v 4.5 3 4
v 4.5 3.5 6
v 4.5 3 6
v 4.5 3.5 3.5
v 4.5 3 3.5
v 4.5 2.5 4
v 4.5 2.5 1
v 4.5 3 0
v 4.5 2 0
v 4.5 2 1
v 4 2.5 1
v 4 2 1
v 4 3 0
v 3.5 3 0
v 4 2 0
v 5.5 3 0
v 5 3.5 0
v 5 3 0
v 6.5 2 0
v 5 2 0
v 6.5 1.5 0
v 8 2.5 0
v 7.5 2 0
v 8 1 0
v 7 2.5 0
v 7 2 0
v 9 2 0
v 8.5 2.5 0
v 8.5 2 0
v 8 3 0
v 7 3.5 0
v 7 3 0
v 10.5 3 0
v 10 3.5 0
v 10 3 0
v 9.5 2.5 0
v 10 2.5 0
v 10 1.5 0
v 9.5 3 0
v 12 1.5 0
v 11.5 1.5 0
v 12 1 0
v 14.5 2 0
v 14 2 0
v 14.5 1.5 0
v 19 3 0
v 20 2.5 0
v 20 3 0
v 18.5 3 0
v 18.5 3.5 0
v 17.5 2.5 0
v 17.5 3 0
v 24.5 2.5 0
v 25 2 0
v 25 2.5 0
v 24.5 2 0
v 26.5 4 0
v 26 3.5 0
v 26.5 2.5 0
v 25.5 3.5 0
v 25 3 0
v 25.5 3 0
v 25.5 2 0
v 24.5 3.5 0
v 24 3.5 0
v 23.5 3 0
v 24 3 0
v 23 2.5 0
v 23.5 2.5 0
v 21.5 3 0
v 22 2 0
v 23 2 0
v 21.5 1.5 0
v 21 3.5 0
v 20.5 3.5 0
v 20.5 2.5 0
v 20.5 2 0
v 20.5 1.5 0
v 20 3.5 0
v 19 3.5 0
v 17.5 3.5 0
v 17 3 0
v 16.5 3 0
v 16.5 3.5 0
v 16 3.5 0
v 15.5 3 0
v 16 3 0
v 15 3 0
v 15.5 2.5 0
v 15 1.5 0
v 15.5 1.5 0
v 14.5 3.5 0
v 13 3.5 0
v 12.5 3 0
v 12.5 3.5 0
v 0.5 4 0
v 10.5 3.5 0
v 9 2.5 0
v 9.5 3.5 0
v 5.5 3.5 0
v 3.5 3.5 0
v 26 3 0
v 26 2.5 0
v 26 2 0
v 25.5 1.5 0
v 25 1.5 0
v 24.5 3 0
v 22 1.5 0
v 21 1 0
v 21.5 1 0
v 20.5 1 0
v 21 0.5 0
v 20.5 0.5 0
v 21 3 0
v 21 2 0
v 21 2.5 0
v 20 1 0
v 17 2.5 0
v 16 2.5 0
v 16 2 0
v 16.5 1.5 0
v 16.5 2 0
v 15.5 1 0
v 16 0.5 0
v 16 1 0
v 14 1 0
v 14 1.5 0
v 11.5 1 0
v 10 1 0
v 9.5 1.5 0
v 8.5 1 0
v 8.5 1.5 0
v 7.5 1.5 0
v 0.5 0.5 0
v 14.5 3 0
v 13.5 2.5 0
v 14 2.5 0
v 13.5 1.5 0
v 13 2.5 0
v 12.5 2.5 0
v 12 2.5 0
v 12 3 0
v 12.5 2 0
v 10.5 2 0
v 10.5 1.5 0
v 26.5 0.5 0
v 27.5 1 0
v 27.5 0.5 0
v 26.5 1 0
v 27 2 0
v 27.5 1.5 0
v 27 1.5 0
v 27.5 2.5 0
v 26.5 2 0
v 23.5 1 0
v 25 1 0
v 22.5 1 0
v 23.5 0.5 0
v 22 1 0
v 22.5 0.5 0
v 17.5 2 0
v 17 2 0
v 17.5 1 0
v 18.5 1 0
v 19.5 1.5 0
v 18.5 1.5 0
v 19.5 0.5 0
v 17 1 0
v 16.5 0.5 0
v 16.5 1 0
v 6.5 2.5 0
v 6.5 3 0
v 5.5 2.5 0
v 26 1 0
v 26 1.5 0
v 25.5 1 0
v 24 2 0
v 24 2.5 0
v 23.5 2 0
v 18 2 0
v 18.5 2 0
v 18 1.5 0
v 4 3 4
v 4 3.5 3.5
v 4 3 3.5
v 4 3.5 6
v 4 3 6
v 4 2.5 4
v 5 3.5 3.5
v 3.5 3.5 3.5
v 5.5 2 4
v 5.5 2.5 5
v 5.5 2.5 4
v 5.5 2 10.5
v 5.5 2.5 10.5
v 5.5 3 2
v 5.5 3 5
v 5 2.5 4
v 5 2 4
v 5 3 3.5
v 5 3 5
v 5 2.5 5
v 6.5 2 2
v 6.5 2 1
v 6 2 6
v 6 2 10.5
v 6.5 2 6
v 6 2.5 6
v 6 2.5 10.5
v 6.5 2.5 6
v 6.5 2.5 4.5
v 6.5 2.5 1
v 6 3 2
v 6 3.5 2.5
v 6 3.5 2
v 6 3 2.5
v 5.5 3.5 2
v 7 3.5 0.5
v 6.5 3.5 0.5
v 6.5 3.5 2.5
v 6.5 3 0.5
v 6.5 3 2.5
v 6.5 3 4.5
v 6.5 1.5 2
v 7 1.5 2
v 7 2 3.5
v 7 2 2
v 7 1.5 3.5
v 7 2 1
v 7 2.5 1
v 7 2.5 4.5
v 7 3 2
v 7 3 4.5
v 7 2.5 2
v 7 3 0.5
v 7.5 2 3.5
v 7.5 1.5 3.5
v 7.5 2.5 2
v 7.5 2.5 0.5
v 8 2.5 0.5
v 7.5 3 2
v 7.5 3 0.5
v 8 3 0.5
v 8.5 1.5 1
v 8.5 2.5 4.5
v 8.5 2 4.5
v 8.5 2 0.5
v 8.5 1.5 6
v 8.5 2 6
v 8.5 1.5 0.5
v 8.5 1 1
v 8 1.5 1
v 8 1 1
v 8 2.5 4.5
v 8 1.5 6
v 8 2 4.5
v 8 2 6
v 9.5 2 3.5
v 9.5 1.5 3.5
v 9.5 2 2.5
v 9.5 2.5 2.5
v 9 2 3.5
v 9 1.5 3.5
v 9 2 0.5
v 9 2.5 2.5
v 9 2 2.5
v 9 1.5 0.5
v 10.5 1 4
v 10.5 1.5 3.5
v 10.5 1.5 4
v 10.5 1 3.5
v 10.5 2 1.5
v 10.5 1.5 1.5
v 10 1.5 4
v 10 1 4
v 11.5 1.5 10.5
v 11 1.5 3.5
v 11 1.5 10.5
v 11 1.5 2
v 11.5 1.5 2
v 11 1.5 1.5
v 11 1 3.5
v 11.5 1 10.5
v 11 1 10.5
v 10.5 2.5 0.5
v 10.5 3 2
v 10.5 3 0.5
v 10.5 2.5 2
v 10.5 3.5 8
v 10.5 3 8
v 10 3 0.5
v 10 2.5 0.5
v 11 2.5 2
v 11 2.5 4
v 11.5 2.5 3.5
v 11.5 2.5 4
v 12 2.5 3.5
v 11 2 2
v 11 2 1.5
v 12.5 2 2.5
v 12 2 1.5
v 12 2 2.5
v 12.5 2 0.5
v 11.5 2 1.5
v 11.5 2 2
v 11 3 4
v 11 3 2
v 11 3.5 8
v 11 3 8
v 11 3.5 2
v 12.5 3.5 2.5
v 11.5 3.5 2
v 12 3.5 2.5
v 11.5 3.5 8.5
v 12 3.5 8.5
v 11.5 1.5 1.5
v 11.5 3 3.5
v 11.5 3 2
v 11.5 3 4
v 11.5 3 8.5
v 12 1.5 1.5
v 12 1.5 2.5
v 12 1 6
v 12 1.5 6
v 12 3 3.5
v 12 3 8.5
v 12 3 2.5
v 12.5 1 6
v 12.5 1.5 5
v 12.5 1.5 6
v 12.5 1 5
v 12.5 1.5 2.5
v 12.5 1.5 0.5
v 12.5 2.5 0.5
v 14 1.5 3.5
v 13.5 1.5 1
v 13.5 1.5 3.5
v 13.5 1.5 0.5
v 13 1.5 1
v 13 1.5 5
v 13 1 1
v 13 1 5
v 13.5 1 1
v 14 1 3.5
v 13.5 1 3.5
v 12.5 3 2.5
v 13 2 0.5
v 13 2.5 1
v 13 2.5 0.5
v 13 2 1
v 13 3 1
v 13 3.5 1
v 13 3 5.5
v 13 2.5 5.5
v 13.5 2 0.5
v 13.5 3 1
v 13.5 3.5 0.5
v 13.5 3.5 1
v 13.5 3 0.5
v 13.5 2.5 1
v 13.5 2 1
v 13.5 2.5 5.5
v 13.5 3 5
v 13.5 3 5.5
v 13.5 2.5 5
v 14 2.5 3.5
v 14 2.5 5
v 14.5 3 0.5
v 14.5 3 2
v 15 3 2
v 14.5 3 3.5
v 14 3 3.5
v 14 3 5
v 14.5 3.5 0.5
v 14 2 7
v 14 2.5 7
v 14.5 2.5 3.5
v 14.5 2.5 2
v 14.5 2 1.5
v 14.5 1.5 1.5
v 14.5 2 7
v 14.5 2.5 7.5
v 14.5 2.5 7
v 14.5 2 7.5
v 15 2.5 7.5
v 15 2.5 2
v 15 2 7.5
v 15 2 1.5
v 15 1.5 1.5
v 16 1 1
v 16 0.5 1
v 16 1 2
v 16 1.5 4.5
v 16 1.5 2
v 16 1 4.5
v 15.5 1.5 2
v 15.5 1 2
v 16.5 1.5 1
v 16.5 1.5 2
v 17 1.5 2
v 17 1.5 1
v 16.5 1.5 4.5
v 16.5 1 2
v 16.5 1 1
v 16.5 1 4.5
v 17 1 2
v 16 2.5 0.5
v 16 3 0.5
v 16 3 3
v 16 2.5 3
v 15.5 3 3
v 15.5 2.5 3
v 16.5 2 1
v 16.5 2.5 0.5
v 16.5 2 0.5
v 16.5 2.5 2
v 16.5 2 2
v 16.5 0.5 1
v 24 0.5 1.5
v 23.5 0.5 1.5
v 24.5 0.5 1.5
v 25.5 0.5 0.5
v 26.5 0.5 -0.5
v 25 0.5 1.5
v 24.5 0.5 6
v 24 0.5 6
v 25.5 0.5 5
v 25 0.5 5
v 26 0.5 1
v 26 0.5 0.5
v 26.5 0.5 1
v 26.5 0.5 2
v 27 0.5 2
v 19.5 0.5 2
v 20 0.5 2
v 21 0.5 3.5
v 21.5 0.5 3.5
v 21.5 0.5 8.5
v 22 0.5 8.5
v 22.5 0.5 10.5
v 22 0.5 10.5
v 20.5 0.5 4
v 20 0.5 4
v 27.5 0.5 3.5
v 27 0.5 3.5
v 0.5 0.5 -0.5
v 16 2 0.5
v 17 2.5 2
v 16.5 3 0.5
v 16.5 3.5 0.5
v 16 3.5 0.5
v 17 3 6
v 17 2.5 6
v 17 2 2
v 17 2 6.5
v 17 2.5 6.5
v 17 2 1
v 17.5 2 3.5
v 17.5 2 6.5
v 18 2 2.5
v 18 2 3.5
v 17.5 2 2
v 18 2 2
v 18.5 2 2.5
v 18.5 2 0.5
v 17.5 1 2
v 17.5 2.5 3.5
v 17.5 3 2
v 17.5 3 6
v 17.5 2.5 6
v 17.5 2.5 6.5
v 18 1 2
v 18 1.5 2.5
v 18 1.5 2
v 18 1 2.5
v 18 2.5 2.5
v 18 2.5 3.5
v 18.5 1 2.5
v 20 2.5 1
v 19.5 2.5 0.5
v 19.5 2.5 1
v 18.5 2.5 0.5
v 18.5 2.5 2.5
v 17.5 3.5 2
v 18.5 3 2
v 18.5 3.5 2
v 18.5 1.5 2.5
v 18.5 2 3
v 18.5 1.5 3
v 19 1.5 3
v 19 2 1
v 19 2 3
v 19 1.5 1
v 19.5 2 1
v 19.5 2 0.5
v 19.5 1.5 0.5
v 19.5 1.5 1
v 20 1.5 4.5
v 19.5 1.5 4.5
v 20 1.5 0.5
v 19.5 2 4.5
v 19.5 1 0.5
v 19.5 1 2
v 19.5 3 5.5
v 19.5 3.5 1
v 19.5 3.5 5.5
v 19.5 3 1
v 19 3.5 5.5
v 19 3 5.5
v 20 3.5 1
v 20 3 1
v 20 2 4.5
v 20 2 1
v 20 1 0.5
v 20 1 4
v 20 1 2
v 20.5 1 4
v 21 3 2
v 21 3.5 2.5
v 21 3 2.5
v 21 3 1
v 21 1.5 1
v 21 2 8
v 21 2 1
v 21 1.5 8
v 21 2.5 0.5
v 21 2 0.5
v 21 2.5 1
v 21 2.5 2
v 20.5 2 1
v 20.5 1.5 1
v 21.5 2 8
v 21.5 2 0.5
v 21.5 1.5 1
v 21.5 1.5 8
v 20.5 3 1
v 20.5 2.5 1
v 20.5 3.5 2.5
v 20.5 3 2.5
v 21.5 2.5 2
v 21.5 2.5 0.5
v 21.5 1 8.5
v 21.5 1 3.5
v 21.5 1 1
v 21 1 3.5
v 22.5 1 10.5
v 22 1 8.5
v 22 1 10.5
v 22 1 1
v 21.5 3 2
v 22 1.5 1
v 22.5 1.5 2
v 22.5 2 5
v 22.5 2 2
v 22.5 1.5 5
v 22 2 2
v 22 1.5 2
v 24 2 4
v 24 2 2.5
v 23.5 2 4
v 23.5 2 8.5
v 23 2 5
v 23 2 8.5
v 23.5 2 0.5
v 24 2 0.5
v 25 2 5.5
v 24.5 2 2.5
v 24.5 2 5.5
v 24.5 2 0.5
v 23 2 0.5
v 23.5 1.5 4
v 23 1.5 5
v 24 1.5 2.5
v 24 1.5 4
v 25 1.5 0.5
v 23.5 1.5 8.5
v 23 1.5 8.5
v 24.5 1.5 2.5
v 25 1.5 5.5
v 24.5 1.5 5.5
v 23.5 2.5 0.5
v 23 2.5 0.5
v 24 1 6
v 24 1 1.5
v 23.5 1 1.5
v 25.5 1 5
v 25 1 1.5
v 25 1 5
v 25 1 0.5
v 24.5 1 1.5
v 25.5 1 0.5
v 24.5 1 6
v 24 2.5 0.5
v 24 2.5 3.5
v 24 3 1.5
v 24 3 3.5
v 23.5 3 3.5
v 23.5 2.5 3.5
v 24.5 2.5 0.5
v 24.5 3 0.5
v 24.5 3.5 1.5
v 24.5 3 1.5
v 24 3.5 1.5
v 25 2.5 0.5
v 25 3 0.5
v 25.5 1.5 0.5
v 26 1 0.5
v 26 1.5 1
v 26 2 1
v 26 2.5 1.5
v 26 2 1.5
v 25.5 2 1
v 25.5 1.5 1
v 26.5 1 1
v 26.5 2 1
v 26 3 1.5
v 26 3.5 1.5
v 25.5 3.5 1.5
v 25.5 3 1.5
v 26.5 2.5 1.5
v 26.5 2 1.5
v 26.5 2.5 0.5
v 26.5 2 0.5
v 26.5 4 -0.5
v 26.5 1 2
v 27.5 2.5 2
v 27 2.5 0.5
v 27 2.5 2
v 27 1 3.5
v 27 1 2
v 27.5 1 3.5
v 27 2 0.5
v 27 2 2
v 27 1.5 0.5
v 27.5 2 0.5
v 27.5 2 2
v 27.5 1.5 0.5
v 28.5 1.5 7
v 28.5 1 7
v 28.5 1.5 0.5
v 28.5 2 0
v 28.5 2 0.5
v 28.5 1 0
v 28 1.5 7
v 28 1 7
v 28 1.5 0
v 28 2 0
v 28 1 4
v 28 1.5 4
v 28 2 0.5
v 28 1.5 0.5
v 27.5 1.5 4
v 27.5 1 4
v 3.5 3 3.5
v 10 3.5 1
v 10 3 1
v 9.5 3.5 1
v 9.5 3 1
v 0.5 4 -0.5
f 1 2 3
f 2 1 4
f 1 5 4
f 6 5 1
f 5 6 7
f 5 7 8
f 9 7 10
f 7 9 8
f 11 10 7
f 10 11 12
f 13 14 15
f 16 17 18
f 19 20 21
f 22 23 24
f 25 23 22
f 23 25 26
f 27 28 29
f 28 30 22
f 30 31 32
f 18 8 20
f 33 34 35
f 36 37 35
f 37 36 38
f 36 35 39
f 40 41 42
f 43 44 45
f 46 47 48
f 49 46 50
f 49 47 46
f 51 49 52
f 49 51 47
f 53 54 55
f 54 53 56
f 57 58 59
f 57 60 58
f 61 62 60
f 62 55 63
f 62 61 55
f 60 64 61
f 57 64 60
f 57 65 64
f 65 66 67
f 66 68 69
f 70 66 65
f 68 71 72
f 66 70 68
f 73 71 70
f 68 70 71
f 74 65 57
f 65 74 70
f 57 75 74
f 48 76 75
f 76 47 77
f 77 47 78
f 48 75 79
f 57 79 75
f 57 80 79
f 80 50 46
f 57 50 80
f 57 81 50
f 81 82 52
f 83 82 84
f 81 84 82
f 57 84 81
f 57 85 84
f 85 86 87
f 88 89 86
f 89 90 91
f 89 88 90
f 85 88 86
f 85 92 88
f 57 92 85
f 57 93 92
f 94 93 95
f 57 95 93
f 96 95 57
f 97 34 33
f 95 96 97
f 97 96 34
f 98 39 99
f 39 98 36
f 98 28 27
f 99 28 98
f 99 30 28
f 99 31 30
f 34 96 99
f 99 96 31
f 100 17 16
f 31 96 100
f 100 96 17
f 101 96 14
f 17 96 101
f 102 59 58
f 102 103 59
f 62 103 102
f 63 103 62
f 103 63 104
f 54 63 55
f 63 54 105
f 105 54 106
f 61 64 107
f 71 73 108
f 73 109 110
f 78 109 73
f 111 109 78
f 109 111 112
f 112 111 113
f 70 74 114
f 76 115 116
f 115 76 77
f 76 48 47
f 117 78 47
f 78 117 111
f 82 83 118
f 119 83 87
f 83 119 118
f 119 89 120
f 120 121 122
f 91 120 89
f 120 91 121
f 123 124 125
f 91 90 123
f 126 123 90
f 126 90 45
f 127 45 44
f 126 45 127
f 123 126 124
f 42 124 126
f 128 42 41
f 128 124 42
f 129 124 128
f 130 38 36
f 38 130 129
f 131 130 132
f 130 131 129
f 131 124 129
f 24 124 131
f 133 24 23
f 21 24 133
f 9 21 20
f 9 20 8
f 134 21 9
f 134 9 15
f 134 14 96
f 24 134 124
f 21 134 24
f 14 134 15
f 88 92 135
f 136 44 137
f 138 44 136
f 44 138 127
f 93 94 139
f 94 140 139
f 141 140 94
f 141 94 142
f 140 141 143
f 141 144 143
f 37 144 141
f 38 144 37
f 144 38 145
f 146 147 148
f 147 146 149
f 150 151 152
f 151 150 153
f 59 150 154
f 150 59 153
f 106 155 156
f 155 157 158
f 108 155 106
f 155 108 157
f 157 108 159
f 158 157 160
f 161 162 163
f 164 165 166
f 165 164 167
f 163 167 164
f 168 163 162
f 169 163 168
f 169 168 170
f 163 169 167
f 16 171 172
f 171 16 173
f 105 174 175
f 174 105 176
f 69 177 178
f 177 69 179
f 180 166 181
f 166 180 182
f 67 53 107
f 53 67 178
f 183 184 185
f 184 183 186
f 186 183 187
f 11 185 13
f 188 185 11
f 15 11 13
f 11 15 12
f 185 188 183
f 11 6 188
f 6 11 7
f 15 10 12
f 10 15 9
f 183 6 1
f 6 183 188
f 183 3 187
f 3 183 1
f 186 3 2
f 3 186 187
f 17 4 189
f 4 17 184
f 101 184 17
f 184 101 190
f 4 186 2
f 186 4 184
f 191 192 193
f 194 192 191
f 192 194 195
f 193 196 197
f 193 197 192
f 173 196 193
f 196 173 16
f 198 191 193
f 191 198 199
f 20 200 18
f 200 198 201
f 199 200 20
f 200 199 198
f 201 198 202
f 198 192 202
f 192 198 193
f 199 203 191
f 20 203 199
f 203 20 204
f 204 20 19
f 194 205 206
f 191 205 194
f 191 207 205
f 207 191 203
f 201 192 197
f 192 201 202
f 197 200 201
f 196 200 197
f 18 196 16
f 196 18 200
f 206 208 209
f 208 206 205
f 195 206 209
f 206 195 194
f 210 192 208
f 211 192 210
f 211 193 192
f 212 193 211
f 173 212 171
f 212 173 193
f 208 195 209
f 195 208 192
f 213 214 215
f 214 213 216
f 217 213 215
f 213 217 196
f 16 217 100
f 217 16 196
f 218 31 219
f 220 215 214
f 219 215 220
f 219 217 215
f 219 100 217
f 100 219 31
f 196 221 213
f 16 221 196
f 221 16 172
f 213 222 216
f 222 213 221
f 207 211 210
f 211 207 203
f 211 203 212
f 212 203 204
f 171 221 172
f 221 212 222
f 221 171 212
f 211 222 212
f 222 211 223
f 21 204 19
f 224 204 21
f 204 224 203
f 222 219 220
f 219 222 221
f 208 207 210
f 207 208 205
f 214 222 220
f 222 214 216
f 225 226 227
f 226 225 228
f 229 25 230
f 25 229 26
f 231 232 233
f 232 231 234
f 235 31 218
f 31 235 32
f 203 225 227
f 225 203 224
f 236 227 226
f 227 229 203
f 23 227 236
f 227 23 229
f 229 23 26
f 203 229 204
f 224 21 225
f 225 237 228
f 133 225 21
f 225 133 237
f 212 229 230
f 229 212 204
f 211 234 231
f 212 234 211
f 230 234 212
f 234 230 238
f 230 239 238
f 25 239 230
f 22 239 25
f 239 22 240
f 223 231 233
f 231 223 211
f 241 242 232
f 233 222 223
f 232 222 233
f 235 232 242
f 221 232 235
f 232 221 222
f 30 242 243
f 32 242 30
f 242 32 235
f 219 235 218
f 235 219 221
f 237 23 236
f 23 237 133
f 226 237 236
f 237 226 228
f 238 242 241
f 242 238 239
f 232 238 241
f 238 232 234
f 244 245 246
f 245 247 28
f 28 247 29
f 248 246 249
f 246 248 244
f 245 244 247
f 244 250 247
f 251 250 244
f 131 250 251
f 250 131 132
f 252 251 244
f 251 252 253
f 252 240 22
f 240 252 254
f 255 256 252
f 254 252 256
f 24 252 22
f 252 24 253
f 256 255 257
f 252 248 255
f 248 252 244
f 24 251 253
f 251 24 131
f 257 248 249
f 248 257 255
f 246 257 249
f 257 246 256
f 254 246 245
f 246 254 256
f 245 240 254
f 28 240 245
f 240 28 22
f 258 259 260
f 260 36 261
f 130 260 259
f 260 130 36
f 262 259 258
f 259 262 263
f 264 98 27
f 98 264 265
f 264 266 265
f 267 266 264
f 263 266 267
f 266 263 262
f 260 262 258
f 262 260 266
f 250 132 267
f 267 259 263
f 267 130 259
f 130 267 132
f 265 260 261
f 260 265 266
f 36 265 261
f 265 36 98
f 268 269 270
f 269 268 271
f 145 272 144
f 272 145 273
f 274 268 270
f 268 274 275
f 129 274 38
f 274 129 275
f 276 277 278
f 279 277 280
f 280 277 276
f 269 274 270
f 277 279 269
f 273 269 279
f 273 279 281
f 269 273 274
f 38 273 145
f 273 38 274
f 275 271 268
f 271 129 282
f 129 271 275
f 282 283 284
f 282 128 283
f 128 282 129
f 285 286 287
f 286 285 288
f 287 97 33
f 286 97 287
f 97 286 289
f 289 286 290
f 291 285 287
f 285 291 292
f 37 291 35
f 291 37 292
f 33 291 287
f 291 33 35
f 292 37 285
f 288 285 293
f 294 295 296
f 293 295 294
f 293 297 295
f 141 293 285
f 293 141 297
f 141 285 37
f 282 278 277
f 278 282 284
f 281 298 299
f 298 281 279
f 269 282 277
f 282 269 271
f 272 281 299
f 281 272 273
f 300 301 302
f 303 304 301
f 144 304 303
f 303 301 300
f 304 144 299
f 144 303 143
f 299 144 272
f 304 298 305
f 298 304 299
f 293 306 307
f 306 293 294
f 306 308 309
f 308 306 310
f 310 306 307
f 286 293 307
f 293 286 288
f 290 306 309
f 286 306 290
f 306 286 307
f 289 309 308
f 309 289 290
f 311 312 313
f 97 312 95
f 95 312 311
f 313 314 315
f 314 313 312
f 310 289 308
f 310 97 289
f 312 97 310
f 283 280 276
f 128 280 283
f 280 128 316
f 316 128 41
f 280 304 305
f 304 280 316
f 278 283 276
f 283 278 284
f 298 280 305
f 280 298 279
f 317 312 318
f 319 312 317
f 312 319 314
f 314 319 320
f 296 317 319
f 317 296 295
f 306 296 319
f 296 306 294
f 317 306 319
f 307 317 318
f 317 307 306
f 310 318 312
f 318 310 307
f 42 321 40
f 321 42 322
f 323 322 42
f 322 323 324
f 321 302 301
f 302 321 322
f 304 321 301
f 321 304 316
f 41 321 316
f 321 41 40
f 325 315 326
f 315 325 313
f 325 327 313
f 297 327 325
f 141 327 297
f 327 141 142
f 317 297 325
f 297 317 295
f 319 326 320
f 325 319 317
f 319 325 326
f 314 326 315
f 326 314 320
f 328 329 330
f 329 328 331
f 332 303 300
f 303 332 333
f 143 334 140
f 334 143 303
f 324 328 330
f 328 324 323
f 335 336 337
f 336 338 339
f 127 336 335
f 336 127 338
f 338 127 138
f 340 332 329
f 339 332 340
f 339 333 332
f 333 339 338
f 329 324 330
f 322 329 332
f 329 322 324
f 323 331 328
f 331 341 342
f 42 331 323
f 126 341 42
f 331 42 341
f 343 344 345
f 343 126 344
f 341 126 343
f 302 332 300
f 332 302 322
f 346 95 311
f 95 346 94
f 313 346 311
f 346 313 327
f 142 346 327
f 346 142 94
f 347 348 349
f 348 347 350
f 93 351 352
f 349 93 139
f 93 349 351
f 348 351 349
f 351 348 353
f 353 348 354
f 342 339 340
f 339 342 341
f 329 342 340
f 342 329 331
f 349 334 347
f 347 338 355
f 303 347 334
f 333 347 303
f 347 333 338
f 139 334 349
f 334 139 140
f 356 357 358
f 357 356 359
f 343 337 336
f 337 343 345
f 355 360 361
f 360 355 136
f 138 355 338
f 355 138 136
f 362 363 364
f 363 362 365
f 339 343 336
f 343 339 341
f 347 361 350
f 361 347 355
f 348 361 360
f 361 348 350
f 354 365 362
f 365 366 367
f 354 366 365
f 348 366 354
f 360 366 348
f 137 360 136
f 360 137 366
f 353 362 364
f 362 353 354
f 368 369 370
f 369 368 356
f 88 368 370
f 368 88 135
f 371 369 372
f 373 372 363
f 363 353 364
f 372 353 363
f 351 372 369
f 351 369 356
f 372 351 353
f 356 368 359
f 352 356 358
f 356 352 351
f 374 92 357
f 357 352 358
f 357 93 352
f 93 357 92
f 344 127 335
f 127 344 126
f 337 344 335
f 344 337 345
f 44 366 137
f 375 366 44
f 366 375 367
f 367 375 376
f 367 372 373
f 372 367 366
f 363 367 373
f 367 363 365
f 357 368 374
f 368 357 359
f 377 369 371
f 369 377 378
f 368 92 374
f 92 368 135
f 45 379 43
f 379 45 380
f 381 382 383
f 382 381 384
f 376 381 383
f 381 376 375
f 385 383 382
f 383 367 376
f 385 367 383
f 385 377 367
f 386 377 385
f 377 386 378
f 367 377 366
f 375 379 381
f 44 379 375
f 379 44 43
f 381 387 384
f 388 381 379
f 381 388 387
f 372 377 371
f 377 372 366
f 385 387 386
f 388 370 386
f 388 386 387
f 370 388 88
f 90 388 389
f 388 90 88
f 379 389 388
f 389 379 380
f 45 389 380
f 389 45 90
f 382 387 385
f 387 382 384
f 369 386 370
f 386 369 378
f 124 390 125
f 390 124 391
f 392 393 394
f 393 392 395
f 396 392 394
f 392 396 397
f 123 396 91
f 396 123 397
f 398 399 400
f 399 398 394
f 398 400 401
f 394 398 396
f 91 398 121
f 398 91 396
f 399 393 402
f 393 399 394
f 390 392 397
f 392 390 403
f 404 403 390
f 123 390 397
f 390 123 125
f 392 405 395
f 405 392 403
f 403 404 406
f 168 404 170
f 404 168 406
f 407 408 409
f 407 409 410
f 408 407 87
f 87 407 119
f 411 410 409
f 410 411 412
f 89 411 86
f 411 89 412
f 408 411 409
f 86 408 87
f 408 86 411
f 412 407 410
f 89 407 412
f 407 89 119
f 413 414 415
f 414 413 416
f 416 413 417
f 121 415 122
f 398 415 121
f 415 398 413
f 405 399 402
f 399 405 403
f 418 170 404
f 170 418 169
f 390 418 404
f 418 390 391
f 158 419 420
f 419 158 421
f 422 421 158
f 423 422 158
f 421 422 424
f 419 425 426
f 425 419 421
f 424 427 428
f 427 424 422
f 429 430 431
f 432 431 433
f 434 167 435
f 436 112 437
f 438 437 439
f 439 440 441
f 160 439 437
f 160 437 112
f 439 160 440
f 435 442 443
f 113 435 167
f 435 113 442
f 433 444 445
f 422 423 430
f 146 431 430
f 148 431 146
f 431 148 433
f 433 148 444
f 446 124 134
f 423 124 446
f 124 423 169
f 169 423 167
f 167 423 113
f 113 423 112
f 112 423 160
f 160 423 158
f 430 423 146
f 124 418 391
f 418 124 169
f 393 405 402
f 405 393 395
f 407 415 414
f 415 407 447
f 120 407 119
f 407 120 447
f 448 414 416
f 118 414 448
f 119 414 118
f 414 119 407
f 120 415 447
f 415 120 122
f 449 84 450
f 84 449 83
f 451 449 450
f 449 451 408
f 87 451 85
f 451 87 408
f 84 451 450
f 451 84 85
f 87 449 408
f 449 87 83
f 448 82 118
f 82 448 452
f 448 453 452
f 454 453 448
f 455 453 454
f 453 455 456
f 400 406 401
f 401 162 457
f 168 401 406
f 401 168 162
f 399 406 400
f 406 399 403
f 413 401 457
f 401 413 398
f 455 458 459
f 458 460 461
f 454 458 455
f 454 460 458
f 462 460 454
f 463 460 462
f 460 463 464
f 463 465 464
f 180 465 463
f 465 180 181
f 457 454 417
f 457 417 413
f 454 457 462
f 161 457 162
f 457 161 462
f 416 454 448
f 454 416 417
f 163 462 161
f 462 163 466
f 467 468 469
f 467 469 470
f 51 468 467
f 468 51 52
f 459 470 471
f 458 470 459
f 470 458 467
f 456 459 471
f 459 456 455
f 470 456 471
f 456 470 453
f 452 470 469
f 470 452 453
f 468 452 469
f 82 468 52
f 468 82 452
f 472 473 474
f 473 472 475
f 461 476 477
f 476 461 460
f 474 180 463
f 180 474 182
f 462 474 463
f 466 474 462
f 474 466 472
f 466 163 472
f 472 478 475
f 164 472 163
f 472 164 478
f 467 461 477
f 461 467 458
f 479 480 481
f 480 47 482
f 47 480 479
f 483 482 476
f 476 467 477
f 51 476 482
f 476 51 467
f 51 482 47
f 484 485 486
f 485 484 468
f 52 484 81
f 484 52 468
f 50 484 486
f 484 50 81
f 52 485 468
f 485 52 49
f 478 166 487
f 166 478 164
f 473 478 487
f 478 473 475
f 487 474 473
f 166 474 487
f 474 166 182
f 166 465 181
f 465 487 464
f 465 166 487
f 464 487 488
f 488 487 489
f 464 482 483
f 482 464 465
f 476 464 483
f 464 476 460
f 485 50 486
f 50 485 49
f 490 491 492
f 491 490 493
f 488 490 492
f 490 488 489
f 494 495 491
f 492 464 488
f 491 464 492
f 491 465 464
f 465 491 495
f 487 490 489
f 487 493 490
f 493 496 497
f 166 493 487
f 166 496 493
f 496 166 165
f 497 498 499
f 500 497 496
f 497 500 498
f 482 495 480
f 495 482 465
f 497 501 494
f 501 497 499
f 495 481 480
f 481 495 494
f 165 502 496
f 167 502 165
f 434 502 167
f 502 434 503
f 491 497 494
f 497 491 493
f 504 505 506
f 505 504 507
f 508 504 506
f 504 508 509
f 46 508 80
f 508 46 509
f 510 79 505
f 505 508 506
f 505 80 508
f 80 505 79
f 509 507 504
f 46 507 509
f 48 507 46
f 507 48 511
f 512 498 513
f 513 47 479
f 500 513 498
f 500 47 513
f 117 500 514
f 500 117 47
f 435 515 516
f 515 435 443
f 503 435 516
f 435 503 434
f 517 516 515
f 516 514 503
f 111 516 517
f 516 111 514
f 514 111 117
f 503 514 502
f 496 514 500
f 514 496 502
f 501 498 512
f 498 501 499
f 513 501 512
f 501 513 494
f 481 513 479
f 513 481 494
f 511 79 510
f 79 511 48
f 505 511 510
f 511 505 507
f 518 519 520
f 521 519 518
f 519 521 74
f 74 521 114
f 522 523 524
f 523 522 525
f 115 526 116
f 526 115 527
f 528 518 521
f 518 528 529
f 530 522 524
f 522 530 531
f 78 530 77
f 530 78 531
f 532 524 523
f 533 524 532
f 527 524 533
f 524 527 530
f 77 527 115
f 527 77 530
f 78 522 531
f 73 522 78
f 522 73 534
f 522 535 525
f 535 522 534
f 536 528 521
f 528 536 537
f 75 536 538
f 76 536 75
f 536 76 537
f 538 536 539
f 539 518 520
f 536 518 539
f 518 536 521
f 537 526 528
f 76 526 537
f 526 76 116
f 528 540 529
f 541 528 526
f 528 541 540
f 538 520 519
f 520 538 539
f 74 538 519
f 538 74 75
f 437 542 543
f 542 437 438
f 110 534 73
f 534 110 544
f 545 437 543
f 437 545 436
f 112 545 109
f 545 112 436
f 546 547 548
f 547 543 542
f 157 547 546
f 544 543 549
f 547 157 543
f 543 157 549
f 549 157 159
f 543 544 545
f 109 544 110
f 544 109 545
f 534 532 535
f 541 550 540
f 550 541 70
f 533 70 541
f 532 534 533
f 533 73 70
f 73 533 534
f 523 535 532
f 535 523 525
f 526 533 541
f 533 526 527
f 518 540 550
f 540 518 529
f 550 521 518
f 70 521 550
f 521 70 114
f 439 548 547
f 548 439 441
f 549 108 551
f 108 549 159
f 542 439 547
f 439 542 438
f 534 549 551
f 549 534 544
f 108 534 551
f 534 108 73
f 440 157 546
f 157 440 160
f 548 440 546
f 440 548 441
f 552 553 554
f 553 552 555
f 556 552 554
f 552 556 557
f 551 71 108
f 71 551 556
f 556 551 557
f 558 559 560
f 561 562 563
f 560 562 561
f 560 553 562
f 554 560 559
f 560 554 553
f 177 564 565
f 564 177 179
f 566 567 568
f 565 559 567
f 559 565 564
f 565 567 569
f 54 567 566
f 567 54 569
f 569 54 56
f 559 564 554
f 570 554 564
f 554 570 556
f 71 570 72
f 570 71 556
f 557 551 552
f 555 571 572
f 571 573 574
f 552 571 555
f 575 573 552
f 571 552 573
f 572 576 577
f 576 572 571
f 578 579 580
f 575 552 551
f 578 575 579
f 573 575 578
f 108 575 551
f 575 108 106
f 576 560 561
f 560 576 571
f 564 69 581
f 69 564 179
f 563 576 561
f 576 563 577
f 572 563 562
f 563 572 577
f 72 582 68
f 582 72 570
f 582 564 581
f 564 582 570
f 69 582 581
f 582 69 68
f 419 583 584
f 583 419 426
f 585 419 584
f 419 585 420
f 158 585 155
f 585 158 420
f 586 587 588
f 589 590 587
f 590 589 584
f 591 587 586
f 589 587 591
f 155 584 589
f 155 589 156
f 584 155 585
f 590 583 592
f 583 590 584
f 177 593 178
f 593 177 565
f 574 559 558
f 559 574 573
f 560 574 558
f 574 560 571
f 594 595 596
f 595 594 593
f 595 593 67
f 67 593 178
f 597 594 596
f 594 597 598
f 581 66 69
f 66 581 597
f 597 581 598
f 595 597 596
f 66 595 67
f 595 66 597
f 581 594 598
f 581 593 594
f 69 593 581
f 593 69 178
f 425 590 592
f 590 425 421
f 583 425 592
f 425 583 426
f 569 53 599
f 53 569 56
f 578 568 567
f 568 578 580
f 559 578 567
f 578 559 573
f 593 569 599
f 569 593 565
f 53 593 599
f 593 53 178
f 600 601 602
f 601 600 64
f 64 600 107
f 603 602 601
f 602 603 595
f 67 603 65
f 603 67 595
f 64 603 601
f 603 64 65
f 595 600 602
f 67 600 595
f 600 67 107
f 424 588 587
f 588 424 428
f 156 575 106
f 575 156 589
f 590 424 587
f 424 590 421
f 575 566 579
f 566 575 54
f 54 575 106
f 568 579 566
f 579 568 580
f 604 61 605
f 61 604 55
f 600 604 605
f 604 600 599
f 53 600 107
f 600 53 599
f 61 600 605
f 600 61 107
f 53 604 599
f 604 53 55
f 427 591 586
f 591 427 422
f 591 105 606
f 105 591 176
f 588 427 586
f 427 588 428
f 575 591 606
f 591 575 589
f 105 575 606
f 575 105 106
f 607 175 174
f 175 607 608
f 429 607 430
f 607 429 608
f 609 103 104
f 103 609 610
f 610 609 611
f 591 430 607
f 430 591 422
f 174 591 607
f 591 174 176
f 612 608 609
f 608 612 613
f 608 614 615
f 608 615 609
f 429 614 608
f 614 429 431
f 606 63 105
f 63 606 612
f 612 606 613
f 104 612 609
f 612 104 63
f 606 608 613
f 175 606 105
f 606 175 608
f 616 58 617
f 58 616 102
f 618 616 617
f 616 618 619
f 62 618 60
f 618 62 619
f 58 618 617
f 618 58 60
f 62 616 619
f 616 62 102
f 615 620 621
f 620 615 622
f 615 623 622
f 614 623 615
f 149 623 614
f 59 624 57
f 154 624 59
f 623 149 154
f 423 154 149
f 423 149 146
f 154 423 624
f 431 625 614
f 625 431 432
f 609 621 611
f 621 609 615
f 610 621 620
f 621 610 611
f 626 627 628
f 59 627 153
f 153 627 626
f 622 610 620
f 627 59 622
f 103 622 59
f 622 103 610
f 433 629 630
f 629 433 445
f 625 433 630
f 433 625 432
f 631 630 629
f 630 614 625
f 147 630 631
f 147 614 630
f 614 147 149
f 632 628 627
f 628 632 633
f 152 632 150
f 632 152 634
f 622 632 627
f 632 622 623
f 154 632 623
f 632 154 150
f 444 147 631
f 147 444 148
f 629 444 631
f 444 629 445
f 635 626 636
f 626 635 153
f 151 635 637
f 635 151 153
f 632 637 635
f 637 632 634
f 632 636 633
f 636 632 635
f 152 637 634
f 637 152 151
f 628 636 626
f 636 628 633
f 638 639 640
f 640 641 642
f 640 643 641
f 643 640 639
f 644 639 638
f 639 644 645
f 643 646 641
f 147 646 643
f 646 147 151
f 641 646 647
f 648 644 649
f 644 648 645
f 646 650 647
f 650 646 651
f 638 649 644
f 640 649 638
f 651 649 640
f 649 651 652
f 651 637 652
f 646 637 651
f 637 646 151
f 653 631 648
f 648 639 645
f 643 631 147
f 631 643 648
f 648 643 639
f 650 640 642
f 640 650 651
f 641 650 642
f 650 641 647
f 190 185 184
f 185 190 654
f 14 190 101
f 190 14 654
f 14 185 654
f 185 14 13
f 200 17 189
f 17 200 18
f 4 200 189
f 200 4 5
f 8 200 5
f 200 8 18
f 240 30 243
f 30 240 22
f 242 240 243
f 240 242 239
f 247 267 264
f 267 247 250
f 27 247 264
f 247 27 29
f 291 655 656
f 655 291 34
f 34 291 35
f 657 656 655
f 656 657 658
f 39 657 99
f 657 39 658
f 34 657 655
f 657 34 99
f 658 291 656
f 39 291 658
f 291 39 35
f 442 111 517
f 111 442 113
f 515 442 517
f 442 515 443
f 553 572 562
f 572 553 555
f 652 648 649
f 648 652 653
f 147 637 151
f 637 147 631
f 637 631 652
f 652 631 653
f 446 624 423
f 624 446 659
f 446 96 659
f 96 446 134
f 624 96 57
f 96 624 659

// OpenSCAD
// this file is mostly working, but the grid seems to not be matching up exactly with the github cal
// wanting to hulk smash openscad right now so I'm leaving it alone for a couple of days

// github/tmpvar (with 5 added leading zeros)
graphCal = [0,0,0,0,0,0,0,0,0,0,0,0,0,0,0,0,0,0,0,0,0,0,0,0,0,0,0,0,0,0,0,0,0,2,0,0,0,0,0,0,4,8,0,7,17,21,0,0,3,12,3,10,1,2,4,7,0,0,0,0,2,0,2,4,3,9,9,4,1,0,3,4,11,5,5,0,1,0,9,1,0,0,0,0,0,0,0,2,3,0,0,0,0,0,0,0,0,0,0,0,2,1,0,0,0,2,4,0,0,0,0,8,6,14,7,2,7,15,9,2,0,0,8,4,2,0,0,16,6,1,0,11,10,4,13,9,10,13,10,17,13,7,8,8,3,5,4,2,11,1,0,0,2,1,2,8,6,2,0,0,0,0,1,1,0,0,0,1,1,1,1,12,0,0,0,0,0,0,0,1,1,0,6,0,0,1,0,0,0,0,0,0,0,1,0,0,0,0,0,0,0,0,0,1,1,0,2,0,2,3,4,4,0,1,5,1,0,4,8,0,1,0,0,0,5,0,0,0,3,11,7,0,0,2,0,2,7,0,0,0,5,0,0,0,0,0,1,5,3,1,0,0,0,0,0,0,0,0,0,0,0,0,0,0,0,0,0,0,0,0,0,0,0,0,0,0,0,0,0,0,0,0,0,0,0,0,2,0,1,3,0,0,0,0,0,0,0,0,0,0,0,0,4,0,1,0,0,3,9,0,0,0,0,0,0,0,0,0,0,0,1,2,0,0,2,0,0,0,0,0,1,0,0,0,0,0,0,0,0,0,0,0,0,0,0,0,0,0,0,0,0,0,0,0,4,6,16,6,0,8,0,0,0,0,2,0,0,0,1,2,1];

// draw the plate
translate([0.5, 0.5, -0.5])cube([26, 3.5, 0.5]);

// draw the bars
for (m = [0 : 56]) {
  for (i = [0 : 6]) {	
  translate([m*0.5, i*0.5, 0])cube([0.5, 0.5, graphCal[(m*i)+1]*0.5]);
  echo(graphCal[m*i]);
  }
}
